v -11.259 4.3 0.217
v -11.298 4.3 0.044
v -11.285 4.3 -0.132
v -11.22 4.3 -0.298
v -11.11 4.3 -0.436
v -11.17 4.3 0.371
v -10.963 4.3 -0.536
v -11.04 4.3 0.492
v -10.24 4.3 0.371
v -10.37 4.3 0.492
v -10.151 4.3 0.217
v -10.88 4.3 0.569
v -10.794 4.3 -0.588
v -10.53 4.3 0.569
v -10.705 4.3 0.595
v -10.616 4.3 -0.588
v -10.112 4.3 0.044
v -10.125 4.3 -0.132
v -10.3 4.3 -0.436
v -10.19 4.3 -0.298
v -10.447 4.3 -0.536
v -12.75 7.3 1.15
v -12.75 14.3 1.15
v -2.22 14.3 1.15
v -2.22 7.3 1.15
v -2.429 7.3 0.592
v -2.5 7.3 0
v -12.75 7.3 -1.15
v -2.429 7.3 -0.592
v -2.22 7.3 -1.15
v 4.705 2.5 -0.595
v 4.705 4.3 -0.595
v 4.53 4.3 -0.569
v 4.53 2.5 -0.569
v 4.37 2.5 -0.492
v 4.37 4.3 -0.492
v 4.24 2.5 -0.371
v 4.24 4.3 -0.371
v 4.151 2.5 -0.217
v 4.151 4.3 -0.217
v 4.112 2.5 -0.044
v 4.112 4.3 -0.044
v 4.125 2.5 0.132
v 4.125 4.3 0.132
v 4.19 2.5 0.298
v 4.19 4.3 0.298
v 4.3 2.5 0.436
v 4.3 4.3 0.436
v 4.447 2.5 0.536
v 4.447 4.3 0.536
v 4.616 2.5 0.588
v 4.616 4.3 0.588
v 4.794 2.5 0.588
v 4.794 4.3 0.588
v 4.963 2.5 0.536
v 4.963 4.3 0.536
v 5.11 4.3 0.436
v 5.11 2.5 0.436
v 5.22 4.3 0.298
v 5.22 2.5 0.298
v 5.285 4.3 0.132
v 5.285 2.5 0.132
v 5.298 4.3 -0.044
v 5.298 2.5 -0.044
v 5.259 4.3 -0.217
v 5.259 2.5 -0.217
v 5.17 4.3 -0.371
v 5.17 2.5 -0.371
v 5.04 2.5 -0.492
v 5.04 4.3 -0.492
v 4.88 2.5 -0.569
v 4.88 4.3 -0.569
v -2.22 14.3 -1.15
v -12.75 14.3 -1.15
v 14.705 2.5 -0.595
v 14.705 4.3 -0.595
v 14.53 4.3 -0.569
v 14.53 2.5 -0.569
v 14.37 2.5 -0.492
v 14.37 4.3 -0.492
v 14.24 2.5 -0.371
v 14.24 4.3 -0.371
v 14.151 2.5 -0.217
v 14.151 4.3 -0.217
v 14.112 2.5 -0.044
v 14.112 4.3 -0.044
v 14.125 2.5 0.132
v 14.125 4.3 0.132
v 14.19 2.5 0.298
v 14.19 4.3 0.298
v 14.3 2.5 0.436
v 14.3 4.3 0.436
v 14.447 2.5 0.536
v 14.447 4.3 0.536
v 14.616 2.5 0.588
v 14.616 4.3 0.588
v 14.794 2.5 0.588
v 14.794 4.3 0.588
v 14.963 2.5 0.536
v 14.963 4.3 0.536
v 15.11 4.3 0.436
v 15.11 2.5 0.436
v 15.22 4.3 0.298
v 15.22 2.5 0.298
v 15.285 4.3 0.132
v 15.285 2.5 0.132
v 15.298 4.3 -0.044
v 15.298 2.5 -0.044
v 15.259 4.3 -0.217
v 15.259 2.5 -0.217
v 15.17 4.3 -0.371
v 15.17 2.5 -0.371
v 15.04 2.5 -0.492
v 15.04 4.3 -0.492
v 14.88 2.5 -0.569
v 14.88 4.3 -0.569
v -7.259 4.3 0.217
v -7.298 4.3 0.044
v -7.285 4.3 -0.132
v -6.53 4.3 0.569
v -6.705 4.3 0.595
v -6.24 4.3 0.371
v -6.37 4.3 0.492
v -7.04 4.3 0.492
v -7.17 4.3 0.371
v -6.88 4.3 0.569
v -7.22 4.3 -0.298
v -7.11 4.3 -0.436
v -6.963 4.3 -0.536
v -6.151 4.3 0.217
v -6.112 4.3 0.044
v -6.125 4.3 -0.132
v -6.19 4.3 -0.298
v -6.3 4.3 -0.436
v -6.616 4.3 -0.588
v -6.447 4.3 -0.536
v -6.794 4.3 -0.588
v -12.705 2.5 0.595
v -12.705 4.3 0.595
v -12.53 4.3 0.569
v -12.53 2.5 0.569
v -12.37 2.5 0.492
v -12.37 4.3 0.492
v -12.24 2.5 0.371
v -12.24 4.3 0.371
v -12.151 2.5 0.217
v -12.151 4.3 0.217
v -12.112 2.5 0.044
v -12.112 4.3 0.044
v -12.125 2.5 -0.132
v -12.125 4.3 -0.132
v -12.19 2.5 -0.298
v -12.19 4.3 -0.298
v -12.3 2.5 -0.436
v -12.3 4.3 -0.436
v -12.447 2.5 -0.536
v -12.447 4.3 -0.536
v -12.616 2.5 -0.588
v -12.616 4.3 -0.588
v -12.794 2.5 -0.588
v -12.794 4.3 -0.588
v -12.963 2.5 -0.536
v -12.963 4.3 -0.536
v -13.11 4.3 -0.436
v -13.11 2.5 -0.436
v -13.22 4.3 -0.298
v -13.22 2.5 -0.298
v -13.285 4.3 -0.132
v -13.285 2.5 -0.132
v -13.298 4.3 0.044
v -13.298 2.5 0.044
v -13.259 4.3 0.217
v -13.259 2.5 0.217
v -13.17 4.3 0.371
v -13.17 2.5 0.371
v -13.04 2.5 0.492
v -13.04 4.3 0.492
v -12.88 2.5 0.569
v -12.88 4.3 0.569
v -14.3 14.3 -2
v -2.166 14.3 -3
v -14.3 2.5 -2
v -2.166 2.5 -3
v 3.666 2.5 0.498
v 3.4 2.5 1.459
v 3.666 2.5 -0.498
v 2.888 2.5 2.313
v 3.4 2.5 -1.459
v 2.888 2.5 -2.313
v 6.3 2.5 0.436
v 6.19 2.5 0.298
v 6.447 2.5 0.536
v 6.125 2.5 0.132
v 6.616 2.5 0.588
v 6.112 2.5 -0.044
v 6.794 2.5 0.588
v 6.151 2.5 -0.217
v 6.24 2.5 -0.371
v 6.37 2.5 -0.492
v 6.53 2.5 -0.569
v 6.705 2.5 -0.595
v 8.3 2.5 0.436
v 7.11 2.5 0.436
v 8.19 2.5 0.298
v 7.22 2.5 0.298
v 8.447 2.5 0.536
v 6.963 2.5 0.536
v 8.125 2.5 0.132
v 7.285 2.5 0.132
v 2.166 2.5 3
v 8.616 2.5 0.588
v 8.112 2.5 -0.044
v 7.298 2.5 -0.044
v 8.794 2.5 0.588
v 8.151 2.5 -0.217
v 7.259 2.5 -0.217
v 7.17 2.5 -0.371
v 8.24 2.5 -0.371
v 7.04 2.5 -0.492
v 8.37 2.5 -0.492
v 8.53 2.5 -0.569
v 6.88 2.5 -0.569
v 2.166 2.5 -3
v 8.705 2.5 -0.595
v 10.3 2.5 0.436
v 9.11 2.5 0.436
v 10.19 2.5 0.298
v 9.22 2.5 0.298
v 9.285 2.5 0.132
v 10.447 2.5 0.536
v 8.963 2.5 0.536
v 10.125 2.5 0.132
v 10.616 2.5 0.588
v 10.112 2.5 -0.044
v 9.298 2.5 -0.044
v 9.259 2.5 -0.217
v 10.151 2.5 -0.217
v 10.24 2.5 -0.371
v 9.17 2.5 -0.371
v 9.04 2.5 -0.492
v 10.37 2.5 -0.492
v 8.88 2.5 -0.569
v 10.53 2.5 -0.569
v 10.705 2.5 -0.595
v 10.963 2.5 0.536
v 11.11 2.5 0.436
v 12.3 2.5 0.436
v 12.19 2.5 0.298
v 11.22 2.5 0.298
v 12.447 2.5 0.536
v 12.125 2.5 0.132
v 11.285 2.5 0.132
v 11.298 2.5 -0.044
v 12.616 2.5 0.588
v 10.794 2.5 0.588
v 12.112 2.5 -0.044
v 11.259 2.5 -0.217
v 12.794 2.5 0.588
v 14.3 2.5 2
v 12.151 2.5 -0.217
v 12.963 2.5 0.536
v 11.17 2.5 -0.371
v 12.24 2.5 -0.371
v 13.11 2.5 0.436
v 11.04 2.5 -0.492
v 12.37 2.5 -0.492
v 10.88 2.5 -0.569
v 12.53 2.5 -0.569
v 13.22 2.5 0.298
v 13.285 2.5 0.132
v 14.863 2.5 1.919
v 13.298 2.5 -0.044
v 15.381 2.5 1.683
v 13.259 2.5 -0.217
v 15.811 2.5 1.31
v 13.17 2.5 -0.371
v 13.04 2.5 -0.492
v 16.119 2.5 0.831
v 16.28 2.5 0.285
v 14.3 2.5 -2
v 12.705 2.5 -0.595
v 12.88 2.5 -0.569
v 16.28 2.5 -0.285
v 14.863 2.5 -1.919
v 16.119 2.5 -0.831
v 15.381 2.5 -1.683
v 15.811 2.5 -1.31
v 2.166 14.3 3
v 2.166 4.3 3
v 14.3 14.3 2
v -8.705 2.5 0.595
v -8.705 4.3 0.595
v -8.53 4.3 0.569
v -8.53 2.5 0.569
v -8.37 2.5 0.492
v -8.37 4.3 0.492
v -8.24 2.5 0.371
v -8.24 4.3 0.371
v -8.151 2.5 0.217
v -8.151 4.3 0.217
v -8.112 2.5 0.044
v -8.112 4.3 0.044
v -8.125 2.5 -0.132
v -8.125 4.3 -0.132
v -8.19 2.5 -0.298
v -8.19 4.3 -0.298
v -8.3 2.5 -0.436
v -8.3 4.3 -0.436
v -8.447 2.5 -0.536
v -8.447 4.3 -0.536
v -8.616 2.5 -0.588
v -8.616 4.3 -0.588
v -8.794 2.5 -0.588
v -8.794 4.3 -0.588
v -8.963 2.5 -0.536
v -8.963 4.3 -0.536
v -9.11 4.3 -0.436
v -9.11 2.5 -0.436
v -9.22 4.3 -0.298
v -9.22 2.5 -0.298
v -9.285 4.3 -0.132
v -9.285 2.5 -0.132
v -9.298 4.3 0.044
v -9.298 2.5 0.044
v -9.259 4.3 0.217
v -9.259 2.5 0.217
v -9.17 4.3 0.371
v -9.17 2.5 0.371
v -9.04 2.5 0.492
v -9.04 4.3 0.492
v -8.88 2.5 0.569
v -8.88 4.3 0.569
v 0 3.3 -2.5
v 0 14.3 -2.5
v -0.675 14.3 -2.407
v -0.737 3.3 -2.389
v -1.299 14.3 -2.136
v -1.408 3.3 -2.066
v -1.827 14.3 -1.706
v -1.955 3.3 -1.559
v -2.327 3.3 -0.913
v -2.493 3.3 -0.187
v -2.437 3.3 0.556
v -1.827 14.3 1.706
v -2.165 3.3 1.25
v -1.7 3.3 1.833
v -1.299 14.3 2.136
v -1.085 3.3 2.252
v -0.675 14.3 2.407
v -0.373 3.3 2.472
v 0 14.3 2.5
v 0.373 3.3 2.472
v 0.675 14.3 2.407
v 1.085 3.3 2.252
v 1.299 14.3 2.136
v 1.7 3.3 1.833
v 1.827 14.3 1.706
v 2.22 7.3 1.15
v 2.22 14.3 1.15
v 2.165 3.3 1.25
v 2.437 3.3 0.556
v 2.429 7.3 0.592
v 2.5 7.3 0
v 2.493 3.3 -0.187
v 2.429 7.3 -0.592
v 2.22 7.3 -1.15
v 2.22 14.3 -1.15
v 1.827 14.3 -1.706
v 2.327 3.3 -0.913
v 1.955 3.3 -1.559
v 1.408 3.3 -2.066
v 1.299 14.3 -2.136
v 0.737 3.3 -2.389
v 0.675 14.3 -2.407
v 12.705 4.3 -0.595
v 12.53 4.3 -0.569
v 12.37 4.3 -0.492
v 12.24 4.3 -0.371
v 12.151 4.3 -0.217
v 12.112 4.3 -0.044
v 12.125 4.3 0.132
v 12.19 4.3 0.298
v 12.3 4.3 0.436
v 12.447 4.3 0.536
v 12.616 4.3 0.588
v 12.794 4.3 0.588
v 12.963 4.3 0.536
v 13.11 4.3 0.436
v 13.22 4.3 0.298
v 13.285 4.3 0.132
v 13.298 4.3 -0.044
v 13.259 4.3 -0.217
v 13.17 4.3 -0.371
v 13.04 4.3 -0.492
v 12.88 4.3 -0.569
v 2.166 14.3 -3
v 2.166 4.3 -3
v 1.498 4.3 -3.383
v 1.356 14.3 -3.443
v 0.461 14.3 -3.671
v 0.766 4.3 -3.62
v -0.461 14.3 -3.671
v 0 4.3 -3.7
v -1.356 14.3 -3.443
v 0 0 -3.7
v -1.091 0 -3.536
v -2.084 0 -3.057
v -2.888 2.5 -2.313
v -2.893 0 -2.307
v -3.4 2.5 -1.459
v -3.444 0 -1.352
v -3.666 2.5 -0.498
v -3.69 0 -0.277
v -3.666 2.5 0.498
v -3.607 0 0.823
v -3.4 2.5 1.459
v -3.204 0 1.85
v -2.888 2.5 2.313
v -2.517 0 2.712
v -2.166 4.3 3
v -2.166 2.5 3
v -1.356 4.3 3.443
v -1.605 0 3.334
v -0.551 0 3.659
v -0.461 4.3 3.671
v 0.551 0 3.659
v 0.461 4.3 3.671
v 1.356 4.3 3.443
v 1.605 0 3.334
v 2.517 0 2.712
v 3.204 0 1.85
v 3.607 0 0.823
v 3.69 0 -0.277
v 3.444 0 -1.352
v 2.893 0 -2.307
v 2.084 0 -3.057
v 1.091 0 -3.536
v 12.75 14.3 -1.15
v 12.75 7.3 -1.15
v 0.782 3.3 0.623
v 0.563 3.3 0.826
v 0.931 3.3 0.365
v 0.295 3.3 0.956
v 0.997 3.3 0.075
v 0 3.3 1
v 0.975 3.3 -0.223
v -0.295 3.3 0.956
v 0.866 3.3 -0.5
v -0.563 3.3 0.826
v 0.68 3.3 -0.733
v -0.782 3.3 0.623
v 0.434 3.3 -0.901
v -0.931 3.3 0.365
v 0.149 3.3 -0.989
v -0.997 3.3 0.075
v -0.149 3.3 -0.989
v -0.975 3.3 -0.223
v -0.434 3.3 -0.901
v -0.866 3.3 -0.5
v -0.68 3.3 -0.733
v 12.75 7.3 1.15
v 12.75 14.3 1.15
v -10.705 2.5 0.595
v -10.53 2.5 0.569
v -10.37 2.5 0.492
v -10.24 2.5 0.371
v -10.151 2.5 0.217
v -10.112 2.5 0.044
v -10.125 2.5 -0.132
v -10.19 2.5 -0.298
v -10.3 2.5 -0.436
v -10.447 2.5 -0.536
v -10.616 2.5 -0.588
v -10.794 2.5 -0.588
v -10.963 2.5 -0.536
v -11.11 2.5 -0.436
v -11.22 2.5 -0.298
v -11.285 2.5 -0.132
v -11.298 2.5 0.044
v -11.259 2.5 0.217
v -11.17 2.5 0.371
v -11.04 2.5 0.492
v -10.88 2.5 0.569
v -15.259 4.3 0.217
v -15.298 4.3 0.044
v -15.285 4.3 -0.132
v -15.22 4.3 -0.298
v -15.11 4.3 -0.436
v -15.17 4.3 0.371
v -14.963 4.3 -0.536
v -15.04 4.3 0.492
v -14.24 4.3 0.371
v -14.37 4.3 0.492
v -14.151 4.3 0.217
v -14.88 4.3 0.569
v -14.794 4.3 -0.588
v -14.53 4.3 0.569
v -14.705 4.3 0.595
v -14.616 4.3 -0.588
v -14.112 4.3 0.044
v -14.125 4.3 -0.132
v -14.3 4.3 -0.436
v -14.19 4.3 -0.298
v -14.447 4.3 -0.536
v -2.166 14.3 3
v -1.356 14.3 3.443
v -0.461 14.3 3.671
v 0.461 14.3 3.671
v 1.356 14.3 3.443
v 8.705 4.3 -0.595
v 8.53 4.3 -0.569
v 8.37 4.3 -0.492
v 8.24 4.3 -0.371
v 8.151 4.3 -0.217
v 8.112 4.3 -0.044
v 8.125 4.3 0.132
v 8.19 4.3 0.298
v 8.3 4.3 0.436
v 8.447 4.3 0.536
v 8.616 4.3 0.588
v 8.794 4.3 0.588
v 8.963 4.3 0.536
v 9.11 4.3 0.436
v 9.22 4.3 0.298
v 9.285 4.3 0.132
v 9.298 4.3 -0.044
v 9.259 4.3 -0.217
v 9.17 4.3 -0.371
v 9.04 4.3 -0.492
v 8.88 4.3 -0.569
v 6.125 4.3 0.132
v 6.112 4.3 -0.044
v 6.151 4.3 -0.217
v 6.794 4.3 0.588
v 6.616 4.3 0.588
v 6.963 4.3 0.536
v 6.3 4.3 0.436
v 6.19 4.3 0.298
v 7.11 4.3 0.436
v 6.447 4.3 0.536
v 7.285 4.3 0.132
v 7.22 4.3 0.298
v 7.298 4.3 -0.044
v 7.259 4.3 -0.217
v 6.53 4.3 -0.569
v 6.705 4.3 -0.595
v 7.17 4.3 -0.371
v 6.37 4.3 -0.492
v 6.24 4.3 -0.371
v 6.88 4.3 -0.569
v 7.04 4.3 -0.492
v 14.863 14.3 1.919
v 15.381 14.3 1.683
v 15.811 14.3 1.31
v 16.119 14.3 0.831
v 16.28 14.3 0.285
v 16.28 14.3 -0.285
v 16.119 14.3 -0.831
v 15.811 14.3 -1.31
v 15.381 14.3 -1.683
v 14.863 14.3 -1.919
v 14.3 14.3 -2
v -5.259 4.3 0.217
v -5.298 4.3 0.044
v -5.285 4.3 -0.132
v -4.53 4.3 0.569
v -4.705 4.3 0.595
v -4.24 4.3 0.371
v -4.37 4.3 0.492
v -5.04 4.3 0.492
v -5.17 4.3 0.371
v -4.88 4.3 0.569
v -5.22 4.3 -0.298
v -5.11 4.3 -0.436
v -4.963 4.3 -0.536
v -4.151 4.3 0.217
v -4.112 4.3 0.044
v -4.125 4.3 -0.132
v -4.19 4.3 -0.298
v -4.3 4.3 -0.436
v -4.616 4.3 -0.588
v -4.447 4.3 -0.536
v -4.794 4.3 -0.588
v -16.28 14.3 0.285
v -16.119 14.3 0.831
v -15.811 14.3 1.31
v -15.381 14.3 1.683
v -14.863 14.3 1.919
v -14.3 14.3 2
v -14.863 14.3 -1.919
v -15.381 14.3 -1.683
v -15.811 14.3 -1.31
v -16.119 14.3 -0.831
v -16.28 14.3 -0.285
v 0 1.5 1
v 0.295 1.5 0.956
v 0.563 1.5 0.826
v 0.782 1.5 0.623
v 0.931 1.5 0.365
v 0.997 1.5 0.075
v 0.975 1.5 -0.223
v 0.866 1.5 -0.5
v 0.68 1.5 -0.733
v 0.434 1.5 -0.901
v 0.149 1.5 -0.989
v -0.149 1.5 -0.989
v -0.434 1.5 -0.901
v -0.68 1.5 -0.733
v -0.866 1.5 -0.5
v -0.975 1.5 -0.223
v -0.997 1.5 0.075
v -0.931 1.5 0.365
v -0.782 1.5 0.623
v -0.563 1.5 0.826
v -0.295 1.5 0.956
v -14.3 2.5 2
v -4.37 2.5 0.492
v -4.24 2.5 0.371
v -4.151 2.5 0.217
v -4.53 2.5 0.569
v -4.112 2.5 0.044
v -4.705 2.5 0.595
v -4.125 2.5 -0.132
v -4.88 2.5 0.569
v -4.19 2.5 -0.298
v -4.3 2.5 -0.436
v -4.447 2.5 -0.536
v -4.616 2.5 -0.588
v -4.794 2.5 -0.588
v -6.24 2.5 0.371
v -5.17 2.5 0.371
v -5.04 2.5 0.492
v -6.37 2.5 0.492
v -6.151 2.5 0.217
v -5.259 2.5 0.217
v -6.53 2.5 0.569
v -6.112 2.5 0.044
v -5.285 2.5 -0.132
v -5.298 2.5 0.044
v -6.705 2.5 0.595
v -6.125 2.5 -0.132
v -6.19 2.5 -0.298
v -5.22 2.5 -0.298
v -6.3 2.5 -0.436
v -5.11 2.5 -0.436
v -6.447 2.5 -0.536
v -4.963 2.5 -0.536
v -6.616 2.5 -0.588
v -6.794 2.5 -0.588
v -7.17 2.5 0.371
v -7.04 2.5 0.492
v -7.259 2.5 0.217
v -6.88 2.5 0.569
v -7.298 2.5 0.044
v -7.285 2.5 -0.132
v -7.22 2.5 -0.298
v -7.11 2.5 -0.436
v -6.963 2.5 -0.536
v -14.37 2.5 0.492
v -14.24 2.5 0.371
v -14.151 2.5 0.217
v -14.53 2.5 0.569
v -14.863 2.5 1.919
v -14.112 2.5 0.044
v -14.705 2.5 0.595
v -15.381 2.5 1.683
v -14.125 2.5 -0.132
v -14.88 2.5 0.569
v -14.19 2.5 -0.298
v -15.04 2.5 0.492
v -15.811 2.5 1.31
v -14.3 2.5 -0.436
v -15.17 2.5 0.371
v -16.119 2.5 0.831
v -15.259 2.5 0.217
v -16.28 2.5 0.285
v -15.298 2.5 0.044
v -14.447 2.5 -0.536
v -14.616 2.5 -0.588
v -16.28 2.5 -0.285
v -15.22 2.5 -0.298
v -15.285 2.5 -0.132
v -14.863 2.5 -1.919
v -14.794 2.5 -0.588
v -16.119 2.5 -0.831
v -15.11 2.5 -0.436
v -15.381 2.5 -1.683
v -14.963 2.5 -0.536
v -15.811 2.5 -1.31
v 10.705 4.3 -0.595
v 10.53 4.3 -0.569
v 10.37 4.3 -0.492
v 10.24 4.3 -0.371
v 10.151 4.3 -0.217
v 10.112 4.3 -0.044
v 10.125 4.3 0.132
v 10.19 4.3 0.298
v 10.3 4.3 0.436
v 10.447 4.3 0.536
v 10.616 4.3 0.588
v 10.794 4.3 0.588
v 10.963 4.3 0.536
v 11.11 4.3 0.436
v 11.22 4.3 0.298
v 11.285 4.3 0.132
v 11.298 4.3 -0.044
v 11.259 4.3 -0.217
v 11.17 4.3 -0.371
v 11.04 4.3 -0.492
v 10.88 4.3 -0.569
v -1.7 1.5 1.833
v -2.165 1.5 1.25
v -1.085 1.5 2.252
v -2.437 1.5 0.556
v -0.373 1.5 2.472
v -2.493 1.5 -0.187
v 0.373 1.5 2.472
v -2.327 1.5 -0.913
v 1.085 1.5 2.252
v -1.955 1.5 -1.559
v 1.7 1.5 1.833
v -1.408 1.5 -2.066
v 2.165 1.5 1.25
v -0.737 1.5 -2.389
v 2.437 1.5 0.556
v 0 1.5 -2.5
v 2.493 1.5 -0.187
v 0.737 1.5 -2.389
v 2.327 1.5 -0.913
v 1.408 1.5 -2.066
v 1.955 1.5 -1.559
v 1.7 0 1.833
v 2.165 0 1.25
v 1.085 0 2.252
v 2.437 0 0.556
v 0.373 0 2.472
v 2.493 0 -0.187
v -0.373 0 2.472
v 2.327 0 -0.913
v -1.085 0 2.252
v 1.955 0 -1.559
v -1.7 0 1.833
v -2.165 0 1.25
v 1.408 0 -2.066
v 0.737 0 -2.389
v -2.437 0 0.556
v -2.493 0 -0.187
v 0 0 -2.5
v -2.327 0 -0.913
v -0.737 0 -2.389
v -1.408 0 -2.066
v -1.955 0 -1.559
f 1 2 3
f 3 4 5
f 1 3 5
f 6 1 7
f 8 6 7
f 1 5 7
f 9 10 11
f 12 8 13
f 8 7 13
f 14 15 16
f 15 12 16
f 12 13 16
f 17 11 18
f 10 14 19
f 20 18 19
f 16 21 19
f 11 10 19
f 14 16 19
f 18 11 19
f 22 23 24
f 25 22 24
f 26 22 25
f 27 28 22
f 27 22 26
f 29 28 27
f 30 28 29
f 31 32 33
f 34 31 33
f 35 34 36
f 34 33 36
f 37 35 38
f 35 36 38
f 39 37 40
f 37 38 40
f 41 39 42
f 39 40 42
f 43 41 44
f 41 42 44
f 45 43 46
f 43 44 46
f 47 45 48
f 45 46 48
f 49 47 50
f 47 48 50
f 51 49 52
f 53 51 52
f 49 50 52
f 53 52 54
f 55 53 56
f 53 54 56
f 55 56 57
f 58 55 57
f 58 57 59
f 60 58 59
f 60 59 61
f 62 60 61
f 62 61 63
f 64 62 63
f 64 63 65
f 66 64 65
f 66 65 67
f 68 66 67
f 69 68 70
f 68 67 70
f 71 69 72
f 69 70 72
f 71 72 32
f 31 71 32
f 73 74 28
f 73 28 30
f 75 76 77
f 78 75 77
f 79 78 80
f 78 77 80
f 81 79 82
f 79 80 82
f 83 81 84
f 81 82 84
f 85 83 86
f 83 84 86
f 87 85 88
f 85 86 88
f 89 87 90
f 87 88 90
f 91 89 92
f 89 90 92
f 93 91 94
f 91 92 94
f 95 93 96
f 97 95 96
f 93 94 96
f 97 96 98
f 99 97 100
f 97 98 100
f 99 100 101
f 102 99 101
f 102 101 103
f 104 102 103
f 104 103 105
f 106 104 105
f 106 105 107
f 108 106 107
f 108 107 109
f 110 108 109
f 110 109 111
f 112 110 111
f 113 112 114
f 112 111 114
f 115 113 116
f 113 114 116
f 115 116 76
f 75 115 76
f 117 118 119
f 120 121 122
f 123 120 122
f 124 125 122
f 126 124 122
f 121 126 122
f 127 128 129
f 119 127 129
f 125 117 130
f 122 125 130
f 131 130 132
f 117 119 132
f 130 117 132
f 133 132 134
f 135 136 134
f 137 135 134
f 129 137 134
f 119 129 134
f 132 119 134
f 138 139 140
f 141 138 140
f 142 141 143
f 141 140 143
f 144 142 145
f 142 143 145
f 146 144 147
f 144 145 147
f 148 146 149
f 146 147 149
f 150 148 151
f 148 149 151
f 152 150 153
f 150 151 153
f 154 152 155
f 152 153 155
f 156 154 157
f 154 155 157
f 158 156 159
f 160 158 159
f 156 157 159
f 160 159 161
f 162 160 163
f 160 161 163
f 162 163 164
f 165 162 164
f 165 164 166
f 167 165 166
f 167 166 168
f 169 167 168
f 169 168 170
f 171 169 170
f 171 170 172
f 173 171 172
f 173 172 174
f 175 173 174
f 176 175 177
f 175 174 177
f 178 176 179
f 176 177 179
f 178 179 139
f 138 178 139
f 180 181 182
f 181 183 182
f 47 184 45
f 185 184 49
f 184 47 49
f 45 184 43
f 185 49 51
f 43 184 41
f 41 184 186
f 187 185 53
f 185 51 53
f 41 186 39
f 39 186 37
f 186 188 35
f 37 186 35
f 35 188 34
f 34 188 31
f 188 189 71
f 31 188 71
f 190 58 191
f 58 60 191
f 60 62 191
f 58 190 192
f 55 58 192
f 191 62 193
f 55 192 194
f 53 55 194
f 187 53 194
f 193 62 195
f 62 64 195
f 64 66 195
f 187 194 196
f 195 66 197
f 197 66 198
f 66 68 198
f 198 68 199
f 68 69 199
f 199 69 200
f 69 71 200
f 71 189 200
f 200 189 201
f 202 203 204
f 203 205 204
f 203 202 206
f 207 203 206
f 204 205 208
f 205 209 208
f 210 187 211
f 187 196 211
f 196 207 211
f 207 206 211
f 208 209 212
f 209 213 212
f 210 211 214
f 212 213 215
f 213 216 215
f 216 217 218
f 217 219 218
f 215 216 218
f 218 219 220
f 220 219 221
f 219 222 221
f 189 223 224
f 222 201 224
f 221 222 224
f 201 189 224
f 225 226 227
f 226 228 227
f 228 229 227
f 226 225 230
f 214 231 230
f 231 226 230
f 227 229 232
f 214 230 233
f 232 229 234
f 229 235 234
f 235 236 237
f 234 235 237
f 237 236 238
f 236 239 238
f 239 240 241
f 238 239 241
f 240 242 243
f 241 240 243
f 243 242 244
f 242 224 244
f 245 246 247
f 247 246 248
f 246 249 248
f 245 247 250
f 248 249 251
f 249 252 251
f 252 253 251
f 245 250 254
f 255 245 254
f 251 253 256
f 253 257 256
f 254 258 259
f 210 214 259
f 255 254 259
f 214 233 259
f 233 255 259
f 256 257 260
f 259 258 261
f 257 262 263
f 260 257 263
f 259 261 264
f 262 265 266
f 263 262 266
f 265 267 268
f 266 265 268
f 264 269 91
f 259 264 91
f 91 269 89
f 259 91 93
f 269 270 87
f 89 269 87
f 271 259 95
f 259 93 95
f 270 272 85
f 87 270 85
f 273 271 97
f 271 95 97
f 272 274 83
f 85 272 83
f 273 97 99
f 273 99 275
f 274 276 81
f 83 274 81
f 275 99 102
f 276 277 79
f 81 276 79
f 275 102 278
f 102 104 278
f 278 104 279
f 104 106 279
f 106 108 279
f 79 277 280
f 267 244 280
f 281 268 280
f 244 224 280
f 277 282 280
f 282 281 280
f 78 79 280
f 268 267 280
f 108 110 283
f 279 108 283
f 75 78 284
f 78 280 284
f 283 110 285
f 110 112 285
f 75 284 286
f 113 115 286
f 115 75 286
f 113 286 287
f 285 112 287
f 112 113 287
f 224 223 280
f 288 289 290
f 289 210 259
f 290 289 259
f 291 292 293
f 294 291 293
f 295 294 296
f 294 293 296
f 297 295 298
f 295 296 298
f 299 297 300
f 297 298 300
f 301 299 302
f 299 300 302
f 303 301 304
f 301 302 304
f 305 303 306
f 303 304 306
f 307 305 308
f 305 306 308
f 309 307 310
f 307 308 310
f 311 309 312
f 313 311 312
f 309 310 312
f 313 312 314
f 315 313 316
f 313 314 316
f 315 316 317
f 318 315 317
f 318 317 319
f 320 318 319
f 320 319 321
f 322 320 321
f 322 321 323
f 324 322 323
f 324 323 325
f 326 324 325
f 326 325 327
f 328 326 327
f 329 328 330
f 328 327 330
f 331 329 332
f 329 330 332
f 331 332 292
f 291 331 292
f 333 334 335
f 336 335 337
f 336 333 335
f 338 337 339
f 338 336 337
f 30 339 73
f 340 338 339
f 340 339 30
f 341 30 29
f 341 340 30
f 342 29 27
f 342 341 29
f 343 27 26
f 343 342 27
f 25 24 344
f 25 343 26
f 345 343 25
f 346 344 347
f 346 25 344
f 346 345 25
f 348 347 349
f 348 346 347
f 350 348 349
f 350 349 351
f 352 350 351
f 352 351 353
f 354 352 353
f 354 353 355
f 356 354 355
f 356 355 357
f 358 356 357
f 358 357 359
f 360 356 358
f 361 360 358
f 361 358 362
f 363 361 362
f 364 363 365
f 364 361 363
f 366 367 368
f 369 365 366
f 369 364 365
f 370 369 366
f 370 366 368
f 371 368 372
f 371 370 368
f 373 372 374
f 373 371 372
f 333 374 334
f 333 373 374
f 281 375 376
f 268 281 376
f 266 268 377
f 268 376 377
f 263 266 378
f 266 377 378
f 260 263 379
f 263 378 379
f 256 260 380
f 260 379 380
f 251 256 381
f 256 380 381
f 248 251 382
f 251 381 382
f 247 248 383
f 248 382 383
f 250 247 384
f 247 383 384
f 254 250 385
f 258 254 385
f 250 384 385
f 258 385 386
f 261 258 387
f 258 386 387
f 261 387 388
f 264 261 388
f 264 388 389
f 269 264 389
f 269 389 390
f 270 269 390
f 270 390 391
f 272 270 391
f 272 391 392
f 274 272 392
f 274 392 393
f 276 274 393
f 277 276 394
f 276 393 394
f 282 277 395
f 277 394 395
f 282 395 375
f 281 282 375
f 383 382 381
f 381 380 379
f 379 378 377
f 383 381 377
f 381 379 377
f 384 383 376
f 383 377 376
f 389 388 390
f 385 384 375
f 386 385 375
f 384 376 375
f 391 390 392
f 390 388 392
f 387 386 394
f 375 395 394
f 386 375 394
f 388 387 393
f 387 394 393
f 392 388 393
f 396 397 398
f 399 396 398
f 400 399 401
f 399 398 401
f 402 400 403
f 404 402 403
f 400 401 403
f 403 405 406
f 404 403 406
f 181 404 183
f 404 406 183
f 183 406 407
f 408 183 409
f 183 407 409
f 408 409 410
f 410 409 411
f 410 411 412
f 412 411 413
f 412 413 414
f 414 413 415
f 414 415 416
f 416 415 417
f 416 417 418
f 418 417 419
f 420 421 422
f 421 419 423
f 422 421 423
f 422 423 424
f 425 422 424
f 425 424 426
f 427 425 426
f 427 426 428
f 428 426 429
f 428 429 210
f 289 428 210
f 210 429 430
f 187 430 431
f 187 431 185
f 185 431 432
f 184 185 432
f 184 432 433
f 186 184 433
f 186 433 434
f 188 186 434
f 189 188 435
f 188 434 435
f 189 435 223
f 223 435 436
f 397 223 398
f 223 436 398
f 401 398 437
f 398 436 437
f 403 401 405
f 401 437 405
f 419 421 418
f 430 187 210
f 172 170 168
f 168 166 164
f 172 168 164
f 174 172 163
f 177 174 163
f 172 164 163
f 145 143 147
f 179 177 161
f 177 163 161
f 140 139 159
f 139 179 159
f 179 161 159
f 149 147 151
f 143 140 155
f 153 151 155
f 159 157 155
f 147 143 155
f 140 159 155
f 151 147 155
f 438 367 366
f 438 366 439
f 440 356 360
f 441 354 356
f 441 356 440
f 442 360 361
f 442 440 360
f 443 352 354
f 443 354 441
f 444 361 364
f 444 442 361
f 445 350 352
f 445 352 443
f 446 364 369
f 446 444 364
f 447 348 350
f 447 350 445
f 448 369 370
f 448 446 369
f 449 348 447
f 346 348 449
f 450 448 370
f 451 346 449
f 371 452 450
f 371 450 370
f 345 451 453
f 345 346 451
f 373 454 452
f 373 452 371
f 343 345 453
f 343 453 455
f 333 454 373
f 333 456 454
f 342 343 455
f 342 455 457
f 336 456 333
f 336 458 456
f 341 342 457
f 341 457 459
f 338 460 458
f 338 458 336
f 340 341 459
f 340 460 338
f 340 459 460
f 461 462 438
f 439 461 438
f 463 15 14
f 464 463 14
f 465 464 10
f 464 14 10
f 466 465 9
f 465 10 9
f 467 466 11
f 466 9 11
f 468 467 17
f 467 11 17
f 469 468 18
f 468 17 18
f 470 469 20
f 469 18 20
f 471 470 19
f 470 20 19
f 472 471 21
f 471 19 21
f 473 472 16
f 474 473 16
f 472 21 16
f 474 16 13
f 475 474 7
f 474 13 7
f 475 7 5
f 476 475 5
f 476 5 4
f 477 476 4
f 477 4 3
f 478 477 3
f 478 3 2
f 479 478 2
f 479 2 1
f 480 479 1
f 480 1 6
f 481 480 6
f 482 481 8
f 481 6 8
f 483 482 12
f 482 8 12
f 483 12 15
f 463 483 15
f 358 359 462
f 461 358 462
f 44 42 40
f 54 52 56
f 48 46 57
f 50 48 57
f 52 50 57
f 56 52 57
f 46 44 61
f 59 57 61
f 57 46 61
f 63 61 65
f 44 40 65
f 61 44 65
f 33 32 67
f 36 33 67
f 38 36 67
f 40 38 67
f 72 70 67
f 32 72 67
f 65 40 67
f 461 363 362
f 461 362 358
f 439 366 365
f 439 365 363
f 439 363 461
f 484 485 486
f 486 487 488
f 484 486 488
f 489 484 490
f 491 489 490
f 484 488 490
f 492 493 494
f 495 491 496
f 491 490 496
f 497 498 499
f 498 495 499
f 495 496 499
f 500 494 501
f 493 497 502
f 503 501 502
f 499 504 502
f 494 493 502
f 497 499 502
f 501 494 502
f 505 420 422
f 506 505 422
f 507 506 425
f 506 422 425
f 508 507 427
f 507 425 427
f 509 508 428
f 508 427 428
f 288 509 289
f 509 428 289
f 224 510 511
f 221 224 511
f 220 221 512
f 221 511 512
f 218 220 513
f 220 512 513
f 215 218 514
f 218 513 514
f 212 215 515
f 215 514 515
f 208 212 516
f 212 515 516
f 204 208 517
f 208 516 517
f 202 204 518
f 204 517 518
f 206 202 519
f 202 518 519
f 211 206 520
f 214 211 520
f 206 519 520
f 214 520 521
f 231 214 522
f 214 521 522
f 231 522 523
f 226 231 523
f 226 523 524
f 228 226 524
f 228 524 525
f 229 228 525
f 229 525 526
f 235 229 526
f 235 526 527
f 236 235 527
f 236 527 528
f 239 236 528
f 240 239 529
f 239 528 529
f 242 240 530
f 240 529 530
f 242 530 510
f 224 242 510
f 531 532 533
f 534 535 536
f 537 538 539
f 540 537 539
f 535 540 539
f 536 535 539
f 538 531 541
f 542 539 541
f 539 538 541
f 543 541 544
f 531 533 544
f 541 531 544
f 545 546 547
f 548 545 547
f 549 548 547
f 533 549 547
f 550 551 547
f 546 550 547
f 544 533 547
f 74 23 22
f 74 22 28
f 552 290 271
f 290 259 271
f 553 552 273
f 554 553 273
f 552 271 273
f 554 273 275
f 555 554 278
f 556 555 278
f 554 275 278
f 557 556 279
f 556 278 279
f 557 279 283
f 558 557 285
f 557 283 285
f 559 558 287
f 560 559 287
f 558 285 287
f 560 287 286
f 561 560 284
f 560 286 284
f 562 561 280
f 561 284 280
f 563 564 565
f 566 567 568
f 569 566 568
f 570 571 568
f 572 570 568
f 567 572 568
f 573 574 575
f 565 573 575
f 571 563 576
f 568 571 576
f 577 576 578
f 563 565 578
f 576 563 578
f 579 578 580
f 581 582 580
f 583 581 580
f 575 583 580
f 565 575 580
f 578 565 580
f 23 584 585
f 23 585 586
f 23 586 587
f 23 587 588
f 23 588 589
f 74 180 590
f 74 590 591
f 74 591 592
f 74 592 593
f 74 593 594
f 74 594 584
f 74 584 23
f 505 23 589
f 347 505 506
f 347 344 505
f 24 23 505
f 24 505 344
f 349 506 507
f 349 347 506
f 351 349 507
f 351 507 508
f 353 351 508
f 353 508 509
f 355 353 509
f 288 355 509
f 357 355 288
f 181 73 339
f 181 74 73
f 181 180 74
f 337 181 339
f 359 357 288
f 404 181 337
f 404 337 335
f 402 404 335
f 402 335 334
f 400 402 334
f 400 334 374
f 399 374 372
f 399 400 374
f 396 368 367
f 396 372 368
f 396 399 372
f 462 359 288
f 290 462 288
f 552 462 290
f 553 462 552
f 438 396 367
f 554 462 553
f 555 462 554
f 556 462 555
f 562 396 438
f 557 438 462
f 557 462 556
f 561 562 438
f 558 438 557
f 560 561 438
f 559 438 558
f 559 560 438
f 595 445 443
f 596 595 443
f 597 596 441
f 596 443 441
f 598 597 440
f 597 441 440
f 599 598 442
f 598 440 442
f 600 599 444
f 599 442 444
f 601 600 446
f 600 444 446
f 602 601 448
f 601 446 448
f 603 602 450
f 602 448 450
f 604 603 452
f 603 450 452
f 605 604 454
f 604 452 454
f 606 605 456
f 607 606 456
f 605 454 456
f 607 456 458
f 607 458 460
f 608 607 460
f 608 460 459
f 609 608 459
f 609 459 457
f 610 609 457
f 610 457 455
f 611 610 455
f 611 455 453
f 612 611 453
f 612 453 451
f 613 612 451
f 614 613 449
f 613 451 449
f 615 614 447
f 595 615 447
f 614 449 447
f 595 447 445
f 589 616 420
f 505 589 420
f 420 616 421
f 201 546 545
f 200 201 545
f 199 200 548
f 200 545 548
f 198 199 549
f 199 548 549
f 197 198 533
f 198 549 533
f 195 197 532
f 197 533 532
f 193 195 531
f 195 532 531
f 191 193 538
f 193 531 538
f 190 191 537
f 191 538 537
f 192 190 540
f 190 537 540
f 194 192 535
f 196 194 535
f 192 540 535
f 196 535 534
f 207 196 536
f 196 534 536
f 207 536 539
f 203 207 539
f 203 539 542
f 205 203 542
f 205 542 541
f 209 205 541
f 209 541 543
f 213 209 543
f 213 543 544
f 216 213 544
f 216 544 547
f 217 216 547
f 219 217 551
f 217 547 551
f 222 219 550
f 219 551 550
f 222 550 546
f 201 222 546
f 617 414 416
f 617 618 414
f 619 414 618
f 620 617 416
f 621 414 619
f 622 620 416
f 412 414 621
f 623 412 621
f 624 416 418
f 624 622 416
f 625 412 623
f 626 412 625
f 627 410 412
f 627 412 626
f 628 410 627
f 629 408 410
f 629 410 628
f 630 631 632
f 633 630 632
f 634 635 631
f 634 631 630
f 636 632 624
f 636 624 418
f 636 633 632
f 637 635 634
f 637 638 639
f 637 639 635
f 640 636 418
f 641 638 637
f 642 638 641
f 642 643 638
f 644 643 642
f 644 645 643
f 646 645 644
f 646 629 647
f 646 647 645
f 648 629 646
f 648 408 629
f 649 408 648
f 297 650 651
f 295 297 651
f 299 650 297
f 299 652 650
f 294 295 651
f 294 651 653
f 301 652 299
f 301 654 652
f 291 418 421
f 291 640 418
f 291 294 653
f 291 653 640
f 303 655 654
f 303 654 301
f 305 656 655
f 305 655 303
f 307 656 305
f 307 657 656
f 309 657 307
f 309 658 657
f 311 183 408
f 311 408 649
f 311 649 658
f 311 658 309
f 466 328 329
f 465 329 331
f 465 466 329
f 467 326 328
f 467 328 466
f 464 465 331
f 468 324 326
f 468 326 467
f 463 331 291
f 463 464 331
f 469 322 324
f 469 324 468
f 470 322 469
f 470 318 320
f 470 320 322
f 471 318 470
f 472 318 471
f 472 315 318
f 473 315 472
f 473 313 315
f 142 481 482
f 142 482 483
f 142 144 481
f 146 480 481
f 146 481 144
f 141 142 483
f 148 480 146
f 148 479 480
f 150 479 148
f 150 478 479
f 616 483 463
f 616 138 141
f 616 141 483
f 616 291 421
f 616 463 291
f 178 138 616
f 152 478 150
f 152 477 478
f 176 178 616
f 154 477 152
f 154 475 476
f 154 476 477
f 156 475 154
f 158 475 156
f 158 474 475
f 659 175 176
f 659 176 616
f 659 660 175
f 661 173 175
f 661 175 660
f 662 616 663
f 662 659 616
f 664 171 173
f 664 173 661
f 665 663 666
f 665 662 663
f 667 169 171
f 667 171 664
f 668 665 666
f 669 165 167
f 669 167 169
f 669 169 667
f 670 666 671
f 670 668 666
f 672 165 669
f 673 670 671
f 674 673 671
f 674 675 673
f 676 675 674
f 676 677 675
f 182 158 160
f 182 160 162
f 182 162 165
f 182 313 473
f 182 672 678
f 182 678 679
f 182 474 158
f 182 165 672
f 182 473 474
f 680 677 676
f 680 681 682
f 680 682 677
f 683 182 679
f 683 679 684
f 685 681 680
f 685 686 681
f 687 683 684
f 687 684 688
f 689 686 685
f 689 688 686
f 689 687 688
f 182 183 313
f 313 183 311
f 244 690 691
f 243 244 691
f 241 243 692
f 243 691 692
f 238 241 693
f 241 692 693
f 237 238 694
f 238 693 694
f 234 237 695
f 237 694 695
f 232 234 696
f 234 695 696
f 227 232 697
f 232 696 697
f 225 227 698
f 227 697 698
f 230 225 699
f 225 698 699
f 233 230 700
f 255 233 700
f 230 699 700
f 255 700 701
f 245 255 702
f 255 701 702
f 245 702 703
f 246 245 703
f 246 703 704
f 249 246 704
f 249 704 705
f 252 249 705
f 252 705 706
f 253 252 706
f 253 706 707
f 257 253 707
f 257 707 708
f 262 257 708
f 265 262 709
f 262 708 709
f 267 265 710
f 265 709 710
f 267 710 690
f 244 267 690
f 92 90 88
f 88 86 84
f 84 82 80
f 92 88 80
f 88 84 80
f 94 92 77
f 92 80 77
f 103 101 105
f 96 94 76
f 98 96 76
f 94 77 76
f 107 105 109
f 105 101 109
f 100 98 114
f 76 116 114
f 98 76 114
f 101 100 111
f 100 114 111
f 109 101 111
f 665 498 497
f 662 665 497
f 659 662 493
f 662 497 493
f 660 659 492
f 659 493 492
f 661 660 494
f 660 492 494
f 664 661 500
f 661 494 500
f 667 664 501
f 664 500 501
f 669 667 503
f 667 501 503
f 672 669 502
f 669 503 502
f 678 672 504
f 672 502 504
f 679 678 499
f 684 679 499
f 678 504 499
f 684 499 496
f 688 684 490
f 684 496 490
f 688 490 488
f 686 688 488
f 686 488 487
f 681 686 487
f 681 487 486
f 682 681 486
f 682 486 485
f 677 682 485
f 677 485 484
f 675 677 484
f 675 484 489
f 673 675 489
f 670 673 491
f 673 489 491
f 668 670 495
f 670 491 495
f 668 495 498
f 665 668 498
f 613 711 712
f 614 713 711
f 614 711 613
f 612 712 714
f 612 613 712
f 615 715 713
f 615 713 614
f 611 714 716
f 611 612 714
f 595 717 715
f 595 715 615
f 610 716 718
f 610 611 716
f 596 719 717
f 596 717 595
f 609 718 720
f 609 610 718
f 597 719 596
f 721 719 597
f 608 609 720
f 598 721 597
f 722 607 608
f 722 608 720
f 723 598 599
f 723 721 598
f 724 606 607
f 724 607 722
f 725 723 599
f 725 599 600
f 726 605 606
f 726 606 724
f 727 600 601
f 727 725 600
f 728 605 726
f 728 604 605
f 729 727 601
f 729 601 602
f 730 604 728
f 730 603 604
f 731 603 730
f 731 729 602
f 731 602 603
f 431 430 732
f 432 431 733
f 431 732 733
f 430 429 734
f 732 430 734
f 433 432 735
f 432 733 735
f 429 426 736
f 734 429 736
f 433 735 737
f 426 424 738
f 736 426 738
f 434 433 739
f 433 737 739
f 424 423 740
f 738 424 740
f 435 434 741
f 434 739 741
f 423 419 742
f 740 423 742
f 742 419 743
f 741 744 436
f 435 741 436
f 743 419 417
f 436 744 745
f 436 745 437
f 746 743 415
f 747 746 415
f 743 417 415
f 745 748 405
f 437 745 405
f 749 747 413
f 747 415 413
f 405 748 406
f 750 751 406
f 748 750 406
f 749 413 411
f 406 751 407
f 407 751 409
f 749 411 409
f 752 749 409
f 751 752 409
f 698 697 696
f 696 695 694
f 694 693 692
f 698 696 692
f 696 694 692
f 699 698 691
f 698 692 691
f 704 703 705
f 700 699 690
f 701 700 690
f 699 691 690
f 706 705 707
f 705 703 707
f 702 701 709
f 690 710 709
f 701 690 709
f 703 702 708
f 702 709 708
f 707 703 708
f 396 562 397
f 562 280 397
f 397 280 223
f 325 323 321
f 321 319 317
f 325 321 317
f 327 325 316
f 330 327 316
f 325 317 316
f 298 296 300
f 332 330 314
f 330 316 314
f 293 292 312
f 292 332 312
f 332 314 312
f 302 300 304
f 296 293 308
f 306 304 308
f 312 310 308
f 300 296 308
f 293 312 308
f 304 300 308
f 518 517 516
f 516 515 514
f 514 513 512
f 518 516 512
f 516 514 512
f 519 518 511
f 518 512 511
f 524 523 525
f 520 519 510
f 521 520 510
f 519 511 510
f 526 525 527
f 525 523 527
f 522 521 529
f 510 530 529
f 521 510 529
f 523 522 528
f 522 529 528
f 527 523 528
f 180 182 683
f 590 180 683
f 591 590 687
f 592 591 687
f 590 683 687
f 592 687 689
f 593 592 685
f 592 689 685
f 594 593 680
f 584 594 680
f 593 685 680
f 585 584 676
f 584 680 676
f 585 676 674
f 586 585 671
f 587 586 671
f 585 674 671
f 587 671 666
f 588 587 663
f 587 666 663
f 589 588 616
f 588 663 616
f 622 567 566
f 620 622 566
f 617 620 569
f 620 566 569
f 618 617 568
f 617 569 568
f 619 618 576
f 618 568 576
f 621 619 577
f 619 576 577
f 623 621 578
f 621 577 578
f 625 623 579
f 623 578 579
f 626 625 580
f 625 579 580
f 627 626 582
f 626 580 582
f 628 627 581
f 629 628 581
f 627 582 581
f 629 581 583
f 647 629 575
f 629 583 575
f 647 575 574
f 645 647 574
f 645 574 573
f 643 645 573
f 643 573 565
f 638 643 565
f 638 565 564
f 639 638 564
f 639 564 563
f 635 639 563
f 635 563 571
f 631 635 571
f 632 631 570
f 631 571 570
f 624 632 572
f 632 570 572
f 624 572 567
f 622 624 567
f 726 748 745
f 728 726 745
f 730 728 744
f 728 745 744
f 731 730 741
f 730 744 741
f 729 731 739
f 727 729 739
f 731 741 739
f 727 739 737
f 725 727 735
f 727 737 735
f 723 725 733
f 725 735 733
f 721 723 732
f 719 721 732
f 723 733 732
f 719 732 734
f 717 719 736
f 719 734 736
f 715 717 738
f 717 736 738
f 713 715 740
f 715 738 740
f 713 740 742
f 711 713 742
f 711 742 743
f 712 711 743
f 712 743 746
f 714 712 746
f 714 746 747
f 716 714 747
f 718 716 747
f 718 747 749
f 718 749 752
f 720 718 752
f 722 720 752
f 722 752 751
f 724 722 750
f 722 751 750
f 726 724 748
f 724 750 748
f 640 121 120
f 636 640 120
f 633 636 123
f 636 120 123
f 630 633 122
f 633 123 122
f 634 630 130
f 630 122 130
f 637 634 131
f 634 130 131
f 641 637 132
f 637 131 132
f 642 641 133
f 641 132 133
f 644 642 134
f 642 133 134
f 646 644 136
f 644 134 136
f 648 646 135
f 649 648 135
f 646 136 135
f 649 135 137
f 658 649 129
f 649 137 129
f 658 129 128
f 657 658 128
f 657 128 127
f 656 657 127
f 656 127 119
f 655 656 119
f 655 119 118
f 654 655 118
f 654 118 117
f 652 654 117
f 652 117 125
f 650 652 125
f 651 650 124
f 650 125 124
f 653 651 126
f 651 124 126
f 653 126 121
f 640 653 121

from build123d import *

# Parameters (mm, degrees)
CROQUIS1_R              = 3.7
SALIENTE_EXTRUIR2_DEPTH = 4.3
CROQUIS2_R              = 2.5
CORTAR_EXTRUIR1_DEPTH   = 1.5
CORTAR_EXTRUIR2_START   = -1
CROQUIS3_R              = 2.5
CORTAR_EXTRUIR2_DEPTH   = 1
CROQUIS4_R              = 1
CORTAR_EXTRUIR3_DEPTH   = 1.8
SALIENTE_EXTRUIR3_DEPTH = 1.8
CROQUIS6_R              = 0.595
CORTAR_EXTRUIR4_DEPTH   = 1.8
SKETCH1_R               = 2.5
BOSS_EXTRUDE1_DEPTH     = 10
SKETCH2_W               = 25.5
SKETCH2_H               = 2.3
CUT_EXTRUDE1_DEPTH      = 7


with BuildPart() as part:
    # Croquis1 → Saliente-Extruir2 (new body)
    with BuildSketch(Plane(origin=(0, 0, 0), x_dir=(1, 0, 0), z_dir=(0, 1, 0))):
        with Locations(Location((0, 0, 0), (0, 0, 90))):
            Circle(CROQUIS1_R)
    extrude(amount=SALIENTE_EXTRUIR2_DEPTH)

    # Croquis2 → Cortar-Extruir1 (cut)
    with BuildSketch(Plane.XZ):
        with Locations(Location((0, 0, 0), (0, 0, 270))):
            Circle(CROQUIS2_R)
    extrude(amount=-CORTAR_EXTRUIR1_DEPTH, mode=Mode.SUBTRACT)

    # Croquis3 → Cortar-Extruir2 (cut)
    with BuildSketch(Plane(origin=(0, 4.3, 0), x_dir=(1, 0, 0), z_dir=(0, 1, 0)).offset(CORTAR_EXTRUIR2_START)):
        with Locations(Location((0, 0, 0), (0, 0, 90))):
            Circle(CROQUIS3_R)
    extrude(amount=CORTAR_EXTRUIR2_DEPTH, mode=Mode.SUBTRACT)

    # Croquis4 → Cortar-Extruir3 (cut)
    with BuildSketch(Plane(origin=(0, 3.3, 0), x_dir=(1, 0, 0), z_dir=(0, 1, 0))):
        with Locations(Location((0, 0, 0), (0, 0, 270))):
            Circle(CROQUIS4_R)
    extrude(amount=-CORTAR_EXTRUIR3_DEPTH, mode=Mode.SUBTRACT)

    # Croquis5 → Saliente-Extruir3 (add)
    with BuildSketch(Plane(origin=(0, 4.3, 0), x_dir=(1, 0, 0), z_dir=(0, 1, 0))):
        with BuildLine():
            Line((-2.16564, 3.000000565), (-3.120237459, 0))
            Line((-3.120237459, 0), (-2.16564, -3.000000565))
            Line((-2.16564, -3.000000565), (-14.3, -2))
            ThreePointArc((-14.3, -2), (-16.3, 0), (-14.3, 2))
            Line((-14.3, 2), (-2.16564, 3.000000565))
        make_face()
        with BuildLine():
            Line((3.120237459, 0), (2.16564, -3.000000565))
            Line((2.16564, -3.000000565), (14.3, -2))
            ThreePointArc((14.3, -2), (16.3, 0), (14.3, 2))
            Line((14.3, 2), (2.16564, 3.000000565))
            Line((2.16564, 3.000000565), (3.120237459, 0))
        make_face()
    extrude(amount=-SALIENTE_EXTRUIR3_DEPTH)

    # Croquis6 → Cortar-Extruir4 (cut)
    with BuildSketch(Plane(origin=(0, 4.3, 0), x_dir=(1, 0, 0), z_dir=(0, 1, 0))):
        with Locations(Location((-14.705, 0, 0), (0, 0, 270))):
            Circle(CROQUIS6_R)
        with Locations(Location((-12.705, 0, 0), (0, 0, 270))):
            Circle(CROQUIS6_R)
        with Locations(Location((-10.705, 0, 0), (0, 0, 270))):
            Circle(CROQUIS6_R)
        with Locations(Location((-8.705, 0, 0), (0, 0, 270))):
            Circle(CROQUIS6_R)
        with Locations(Location((-6.705, 0, 0), (0, 0, 270))):
            Circle(CROQUIS6_R)
        with Locations(Location((-4.705, 0, 0), (0, 0, 270))):
            Circle(CROQUIS6_R)
        with Locations(Location((14.705, 0, 0), (0, 0, 90))):
            Circle(CROQUIS6_R)
        with Locations(Location((12.705, 0, 0), (0, 0, 90))):
            Circle(CROQUIS6_R)
        with Locations(Location((10.705, 0, 0), (0, 0, 90))):
            Circle(CROQUIS6_R)
        with Locations(Location((8.705, 0, 0), (0, 0, 90))):
            Circle(CROQUIS6_R)
        with Locations(Location((6.705, 0, 0), (0, 0, 90))):
            Circle(CROQUIS6_R)
        with Locations(Location((4.705, 0, 0), (0, 0, 90))):
            Circle(CROQUIS6_R)
    extrude(amount=-CORTAR_EXTRUIR4_DEPTH, mode=Mode.SUBTRACT)

    # Sketch1 → Boss-Extrude1 (add)
    with BuildSketch(Plane(origin=(0, 4.3, 0), x_dir=(1, 0, 0), z_dir=(0, 1, 0))):
        with BuildLine():
            Line((2.16564, -3.000000565), (14.3, -2))
            ThreePointArc((14.3, -2), (16.3, 0), (14.3, 2))
            Line((14.3, 2), (2.16564, 3.000000565))
            ThreePointArc((2.16564, 3.000000565), (0, 3.7), (-2.16564, 3.000000565))
            Line((-2.16564, 3.000000565), (-14.3, 2))
            ThreePointArc((-14.3, 2), (-16.3, 0), (-14.3, -2))
            Line((-14.3, -2), (-2.16564, -3.000000565))
            ThreePointArc((-2.16564, -3.000000565), (0, -3.7), (2.16564, -3.000000565))
        make_face()
        with Locations(Location((0, 0, 0), (0, 0, 90))):
            Circle(SKETCH1_R, mode=Mode.SUBTRACT)
    extrude(amount=BOSS_EXTRUDE1_DEPTH)

    # Sketch2 → Cut-Extrude1 (cut)
    with BuildSketch(Plane(origin=(0, 14.3, 0), x_dir=(1, 0, 0), z_dir=(0, 1, 0))):
        Rectangle(SKETCH2_W, SKETCH2_H)
    extrude(amount=-CUT_EXTRUDE1_DEPTH, mode=Mode.SUBTRACT)


solid = part.part
